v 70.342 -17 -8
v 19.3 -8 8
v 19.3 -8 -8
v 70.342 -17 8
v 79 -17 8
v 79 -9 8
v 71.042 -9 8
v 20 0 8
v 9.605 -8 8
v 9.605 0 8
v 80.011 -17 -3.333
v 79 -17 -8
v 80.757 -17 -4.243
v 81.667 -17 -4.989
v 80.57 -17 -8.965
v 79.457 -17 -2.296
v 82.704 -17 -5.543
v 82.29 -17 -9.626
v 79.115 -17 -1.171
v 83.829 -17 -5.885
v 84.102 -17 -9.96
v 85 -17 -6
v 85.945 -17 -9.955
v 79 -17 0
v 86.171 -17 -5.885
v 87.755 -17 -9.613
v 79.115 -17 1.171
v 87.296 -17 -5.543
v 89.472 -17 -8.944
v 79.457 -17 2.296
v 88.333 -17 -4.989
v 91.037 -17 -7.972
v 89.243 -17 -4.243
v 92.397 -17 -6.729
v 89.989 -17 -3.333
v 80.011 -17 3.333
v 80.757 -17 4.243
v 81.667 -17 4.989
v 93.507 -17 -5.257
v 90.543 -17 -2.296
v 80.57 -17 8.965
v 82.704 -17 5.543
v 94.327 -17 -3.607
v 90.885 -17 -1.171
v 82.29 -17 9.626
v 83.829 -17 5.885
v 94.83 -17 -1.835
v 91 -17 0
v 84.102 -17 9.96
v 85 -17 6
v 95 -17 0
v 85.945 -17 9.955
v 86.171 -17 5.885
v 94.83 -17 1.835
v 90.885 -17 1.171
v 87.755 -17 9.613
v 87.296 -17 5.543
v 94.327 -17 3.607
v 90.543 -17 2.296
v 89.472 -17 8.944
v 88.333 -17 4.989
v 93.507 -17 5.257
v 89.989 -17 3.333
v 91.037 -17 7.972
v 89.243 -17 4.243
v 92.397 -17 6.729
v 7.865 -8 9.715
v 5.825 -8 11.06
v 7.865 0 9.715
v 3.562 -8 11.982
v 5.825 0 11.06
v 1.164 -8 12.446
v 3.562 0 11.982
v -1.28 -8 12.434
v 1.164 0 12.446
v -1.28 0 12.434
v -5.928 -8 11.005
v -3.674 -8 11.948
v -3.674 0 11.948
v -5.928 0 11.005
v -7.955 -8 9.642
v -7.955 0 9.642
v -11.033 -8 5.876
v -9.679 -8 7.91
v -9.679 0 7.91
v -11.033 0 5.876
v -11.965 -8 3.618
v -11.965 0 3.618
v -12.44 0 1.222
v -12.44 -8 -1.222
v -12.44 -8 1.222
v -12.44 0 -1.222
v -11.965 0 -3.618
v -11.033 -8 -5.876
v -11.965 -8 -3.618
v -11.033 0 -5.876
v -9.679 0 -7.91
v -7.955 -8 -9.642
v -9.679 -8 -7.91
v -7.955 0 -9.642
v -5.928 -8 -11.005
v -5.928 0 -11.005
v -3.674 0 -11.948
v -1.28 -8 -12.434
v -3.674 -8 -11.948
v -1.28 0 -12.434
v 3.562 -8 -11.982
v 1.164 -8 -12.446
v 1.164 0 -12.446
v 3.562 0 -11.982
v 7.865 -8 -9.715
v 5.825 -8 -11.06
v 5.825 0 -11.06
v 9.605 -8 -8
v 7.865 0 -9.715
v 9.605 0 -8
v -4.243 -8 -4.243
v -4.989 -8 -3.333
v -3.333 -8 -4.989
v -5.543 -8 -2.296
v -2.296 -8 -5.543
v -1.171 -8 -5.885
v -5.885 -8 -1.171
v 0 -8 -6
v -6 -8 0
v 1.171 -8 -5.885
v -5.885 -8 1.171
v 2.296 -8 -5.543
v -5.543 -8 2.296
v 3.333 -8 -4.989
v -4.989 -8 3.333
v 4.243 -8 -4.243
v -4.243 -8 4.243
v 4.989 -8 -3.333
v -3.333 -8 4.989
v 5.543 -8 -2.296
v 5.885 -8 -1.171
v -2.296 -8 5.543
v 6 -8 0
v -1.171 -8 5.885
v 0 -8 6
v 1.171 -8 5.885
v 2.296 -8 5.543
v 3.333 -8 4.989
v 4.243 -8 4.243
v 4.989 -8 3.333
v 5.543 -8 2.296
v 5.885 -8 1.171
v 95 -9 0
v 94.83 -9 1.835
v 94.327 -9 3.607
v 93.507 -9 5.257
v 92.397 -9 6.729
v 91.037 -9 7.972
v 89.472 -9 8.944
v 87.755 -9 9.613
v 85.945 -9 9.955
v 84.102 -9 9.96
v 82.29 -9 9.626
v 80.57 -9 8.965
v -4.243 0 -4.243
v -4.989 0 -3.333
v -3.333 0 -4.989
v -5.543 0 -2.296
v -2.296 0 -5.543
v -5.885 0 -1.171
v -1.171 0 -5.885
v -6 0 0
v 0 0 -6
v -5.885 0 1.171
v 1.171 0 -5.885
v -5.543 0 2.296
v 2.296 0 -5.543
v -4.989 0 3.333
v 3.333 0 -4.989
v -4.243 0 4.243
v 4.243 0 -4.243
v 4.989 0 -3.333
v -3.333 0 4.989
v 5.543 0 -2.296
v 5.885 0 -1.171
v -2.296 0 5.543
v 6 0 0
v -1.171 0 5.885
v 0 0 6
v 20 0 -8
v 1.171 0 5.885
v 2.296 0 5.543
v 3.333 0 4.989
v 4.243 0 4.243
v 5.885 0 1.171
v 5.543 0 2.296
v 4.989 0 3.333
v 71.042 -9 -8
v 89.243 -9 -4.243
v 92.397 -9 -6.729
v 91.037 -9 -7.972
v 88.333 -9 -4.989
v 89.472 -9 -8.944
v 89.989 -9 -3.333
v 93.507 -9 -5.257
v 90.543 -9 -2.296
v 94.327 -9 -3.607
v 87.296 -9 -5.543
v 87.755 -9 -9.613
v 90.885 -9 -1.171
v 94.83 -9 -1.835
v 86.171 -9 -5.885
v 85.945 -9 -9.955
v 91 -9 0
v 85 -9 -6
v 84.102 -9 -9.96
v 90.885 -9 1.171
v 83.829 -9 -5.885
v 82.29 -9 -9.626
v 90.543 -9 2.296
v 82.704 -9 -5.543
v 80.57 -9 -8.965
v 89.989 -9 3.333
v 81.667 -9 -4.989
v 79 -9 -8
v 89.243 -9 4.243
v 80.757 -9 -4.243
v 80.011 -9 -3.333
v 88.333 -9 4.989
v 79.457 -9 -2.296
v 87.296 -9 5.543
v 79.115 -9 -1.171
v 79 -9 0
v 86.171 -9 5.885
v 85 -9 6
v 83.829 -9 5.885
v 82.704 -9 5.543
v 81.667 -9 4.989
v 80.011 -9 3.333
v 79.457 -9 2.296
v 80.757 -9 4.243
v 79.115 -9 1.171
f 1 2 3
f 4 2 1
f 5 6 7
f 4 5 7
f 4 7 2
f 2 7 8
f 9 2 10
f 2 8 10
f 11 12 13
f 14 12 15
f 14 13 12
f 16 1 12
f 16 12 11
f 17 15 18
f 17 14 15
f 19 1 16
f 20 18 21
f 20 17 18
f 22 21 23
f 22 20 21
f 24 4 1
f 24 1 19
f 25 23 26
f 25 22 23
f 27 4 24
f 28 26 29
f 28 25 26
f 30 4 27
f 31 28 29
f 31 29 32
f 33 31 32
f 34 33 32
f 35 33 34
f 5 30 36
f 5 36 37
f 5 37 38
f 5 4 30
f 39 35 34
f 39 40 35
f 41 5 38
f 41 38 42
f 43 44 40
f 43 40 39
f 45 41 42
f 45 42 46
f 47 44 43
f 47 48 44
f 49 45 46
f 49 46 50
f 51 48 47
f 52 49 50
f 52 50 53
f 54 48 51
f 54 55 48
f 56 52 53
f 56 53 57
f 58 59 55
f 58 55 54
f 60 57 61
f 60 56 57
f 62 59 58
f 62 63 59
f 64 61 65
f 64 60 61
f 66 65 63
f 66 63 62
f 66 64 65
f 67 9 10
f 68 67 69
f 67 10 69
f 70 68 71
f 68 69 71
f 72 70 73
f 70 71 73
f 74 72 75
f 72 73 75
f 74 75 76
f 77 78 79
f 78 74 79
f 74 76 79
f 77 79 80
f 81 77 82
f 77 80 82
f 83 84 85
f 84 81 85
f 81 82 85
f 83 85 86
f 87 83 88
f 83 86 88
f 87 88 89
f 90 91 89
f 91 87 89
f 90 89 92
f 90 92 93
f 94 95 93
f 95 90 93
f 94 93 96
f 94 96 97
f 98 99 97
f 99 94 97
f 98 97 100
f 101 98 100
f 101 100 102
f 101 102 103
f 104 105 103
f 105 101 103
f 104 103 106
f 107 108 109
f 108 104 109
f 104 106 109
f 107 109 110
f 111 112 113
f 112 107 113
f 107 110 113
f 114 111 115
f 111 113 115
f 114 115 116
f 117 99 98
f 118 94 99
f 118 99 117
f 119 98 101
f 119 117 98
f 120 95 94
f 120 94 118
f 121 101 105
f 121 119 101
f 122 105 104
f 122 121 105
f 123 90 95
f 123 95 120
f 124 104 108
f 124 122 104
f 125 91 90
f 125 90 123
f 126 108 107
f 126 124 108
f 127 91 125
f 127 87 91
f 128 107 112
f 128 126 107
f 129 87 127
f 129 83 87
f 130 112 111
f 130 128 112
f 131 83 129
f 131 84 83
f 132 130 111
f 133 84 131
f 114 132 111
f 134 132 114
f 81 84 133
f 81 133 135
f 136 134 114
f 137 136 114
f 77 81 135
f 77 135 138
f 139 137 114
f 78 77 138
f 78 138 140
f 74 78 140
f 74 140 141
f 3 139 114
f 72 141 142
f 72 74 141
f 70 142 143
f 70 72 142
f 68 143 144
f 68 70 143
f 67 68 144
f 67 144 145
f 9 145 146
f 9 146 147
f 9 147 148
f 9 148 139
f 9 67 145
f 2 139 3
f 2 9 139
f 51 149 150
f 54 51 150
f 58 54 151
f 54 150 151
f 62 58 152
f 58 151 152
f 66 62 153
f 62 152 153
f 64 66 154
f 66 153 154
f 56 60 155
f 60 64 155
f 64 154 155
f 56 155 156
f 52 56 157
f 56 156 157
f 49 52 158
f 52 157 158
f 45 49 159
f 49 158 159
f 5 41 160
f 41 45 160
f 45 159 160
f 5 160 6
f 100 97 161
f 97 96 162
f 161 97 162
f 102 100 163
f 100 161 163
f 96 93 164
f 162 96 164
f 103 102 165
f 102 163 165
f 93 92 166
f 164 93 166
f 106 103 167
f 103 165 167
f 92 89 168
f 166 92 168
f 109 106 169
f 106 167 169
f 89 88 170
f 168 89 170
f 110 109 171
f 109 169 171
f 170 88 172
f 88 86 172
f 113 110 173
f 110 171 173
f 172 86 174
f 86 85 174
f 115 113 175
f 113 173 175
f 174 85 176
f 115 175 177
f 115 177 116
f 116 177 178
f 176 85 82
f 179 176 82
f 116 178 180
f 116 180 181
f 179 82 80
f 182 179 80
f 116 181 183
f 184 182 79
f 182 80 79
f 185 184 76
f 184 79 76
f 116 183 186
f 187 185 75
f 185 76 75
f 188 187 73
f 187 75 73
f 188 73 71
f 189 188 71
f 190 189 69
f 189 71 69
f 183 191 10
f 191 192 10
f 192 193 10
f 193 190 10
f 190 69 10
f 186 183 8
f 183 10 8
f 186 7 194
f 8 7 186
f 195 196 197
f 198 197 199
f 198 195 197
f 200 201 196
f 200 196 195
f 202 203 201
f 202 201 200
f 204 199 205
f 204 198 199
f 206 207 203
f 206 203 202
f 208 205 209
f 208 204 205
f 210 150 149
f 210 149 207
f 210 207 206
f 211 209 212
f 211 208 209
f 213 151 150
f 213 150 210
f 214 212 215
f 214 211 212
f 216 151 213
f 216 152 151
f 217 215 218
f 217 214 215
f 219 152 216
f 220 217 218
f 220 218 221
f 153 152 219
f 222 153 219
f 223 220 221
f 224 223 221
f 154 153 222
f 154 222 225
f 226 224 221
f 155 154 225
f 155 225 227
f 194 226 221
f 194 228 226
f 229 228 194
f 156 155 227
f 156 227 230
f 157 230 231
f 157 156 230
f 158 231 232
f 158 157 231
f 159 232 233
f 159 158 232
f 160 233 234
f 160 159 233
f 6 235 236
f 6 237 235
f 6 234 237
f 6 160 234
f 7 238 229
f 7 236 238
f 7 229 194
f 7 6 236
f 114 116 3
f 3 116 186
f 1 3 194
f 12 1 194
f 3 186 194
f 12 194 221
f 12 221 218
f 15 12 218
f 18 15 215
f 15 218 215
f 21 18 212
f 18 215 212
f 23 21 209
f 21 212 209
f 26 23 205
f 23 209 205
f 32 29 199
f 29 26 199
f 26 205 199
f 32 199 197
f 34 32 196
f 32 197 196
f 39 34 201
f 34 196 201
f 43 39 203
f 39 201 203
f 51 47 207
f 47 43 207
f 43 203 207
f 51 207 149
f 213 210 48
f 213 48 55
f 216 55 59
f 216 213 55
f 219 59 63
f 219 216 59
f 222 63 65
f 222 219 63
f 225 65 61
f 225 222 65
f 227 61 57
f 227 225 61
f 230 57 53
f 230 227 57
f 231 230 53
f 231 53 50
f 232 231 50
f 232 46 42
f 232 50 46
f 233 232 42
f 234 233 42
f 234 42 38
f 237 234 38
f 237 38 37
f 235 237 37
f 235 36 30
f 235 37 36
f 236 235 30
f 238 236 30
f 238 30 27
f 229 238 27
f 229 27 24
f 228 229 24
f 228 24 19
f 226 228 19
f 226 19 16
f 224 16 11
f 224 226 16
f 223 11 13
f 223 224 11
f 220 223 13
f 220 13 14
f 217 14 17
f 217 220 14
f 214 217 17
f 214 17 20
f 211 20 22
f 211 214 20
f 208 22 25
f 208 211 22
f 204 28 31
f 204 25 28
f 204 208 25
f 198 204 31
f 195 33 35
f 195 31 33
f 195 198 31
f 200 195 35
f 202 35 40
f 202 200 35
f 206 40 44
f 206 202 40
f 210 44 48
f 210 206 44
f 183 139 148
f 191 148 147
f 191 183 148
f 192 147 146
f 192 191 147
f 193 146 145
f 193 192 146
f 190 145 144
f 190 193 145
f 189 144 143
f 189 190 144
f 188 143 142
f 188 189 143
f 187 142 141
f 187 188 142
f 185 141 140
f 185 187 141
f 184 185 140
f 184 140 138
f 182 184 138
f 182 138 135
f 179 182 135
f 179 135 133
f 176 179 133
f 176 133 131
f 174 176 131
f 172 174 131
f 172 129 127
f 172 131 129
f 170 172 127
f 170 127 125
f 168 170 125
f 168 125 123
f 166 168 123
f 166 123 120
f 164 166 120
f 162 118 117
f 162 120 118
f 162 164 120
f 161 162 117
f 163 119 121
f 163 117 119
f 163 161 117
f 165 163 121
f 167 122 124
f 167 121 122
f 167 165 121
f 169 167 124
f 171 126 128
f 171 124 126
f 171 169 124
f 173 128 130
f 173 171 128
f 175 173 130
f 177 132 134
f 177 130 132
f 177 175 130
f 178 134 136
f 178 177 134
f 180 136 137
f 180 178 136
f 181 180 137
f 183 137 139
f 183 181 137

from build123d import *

# Parameters (mm, degrees)
F0_R     = 6
F1_DEPTH = 25
F3_DEPTH = 12.5


with BuildPart() as f1:
    # F0 (on Front) → F1 (new body)
    with BuildSketch(Plane.XZ):
        with BuildLine():
            ThreePointArc((9.604686, -8), (11.753905, -4.253905), (12.5, 0))
            ThreePointArc((12.5, 0), (11.753905, 4.253905), (9.604686, 8))
            ThreePointArc((9.604686, 8), (-12.5, 0), (9.604686, -8))
        make_face()
        Circle(F0_R, mode=Mode.SUBTRACT)
        with BuildLine():
            ThreePointArc((95, 0), (89.472136, 8.944272), (79, 8))
            ThreePointArc((79, 8), (75, 0), (79, -8))
            ThreePointArc((79, -8), (89.472136, -8.944272), (95, 0))
        make_face()
        with Locations((85, 0)):
            Circle(F0_R, mode=Mode.SUBTRACT)
        with BuildLine():
            ThreePointArc((9.604686, 8), (11.753905, 4.253905), (12.5, 0))
            ThreePointArc((12.5, 0), (11.753905, -4.253905), (9.604686, -8))
            Line((9.604686, -8), (79, -8))
            ThreePointArc((79, -8), (75, 0), (79, 8))
            Line((79, 8), (9.604686, 8))
        make_face()
    extrude(amount=F1_DEPTH)

    # F2 (on Top) → F3 (intersect, symmetric)
    with BuildSketch(Plane.XY):
        Polygon((20, 0), (-12.5, 0), (-12.5, -8), (19.300091, -8), (70.341627, -17), (95, -17), (95, -9), (71.041536, -9), align=None)
    extrude(amount=F3_DEPTH, both=True, mode=Mode.INTERSECT)


solid = f1.part
